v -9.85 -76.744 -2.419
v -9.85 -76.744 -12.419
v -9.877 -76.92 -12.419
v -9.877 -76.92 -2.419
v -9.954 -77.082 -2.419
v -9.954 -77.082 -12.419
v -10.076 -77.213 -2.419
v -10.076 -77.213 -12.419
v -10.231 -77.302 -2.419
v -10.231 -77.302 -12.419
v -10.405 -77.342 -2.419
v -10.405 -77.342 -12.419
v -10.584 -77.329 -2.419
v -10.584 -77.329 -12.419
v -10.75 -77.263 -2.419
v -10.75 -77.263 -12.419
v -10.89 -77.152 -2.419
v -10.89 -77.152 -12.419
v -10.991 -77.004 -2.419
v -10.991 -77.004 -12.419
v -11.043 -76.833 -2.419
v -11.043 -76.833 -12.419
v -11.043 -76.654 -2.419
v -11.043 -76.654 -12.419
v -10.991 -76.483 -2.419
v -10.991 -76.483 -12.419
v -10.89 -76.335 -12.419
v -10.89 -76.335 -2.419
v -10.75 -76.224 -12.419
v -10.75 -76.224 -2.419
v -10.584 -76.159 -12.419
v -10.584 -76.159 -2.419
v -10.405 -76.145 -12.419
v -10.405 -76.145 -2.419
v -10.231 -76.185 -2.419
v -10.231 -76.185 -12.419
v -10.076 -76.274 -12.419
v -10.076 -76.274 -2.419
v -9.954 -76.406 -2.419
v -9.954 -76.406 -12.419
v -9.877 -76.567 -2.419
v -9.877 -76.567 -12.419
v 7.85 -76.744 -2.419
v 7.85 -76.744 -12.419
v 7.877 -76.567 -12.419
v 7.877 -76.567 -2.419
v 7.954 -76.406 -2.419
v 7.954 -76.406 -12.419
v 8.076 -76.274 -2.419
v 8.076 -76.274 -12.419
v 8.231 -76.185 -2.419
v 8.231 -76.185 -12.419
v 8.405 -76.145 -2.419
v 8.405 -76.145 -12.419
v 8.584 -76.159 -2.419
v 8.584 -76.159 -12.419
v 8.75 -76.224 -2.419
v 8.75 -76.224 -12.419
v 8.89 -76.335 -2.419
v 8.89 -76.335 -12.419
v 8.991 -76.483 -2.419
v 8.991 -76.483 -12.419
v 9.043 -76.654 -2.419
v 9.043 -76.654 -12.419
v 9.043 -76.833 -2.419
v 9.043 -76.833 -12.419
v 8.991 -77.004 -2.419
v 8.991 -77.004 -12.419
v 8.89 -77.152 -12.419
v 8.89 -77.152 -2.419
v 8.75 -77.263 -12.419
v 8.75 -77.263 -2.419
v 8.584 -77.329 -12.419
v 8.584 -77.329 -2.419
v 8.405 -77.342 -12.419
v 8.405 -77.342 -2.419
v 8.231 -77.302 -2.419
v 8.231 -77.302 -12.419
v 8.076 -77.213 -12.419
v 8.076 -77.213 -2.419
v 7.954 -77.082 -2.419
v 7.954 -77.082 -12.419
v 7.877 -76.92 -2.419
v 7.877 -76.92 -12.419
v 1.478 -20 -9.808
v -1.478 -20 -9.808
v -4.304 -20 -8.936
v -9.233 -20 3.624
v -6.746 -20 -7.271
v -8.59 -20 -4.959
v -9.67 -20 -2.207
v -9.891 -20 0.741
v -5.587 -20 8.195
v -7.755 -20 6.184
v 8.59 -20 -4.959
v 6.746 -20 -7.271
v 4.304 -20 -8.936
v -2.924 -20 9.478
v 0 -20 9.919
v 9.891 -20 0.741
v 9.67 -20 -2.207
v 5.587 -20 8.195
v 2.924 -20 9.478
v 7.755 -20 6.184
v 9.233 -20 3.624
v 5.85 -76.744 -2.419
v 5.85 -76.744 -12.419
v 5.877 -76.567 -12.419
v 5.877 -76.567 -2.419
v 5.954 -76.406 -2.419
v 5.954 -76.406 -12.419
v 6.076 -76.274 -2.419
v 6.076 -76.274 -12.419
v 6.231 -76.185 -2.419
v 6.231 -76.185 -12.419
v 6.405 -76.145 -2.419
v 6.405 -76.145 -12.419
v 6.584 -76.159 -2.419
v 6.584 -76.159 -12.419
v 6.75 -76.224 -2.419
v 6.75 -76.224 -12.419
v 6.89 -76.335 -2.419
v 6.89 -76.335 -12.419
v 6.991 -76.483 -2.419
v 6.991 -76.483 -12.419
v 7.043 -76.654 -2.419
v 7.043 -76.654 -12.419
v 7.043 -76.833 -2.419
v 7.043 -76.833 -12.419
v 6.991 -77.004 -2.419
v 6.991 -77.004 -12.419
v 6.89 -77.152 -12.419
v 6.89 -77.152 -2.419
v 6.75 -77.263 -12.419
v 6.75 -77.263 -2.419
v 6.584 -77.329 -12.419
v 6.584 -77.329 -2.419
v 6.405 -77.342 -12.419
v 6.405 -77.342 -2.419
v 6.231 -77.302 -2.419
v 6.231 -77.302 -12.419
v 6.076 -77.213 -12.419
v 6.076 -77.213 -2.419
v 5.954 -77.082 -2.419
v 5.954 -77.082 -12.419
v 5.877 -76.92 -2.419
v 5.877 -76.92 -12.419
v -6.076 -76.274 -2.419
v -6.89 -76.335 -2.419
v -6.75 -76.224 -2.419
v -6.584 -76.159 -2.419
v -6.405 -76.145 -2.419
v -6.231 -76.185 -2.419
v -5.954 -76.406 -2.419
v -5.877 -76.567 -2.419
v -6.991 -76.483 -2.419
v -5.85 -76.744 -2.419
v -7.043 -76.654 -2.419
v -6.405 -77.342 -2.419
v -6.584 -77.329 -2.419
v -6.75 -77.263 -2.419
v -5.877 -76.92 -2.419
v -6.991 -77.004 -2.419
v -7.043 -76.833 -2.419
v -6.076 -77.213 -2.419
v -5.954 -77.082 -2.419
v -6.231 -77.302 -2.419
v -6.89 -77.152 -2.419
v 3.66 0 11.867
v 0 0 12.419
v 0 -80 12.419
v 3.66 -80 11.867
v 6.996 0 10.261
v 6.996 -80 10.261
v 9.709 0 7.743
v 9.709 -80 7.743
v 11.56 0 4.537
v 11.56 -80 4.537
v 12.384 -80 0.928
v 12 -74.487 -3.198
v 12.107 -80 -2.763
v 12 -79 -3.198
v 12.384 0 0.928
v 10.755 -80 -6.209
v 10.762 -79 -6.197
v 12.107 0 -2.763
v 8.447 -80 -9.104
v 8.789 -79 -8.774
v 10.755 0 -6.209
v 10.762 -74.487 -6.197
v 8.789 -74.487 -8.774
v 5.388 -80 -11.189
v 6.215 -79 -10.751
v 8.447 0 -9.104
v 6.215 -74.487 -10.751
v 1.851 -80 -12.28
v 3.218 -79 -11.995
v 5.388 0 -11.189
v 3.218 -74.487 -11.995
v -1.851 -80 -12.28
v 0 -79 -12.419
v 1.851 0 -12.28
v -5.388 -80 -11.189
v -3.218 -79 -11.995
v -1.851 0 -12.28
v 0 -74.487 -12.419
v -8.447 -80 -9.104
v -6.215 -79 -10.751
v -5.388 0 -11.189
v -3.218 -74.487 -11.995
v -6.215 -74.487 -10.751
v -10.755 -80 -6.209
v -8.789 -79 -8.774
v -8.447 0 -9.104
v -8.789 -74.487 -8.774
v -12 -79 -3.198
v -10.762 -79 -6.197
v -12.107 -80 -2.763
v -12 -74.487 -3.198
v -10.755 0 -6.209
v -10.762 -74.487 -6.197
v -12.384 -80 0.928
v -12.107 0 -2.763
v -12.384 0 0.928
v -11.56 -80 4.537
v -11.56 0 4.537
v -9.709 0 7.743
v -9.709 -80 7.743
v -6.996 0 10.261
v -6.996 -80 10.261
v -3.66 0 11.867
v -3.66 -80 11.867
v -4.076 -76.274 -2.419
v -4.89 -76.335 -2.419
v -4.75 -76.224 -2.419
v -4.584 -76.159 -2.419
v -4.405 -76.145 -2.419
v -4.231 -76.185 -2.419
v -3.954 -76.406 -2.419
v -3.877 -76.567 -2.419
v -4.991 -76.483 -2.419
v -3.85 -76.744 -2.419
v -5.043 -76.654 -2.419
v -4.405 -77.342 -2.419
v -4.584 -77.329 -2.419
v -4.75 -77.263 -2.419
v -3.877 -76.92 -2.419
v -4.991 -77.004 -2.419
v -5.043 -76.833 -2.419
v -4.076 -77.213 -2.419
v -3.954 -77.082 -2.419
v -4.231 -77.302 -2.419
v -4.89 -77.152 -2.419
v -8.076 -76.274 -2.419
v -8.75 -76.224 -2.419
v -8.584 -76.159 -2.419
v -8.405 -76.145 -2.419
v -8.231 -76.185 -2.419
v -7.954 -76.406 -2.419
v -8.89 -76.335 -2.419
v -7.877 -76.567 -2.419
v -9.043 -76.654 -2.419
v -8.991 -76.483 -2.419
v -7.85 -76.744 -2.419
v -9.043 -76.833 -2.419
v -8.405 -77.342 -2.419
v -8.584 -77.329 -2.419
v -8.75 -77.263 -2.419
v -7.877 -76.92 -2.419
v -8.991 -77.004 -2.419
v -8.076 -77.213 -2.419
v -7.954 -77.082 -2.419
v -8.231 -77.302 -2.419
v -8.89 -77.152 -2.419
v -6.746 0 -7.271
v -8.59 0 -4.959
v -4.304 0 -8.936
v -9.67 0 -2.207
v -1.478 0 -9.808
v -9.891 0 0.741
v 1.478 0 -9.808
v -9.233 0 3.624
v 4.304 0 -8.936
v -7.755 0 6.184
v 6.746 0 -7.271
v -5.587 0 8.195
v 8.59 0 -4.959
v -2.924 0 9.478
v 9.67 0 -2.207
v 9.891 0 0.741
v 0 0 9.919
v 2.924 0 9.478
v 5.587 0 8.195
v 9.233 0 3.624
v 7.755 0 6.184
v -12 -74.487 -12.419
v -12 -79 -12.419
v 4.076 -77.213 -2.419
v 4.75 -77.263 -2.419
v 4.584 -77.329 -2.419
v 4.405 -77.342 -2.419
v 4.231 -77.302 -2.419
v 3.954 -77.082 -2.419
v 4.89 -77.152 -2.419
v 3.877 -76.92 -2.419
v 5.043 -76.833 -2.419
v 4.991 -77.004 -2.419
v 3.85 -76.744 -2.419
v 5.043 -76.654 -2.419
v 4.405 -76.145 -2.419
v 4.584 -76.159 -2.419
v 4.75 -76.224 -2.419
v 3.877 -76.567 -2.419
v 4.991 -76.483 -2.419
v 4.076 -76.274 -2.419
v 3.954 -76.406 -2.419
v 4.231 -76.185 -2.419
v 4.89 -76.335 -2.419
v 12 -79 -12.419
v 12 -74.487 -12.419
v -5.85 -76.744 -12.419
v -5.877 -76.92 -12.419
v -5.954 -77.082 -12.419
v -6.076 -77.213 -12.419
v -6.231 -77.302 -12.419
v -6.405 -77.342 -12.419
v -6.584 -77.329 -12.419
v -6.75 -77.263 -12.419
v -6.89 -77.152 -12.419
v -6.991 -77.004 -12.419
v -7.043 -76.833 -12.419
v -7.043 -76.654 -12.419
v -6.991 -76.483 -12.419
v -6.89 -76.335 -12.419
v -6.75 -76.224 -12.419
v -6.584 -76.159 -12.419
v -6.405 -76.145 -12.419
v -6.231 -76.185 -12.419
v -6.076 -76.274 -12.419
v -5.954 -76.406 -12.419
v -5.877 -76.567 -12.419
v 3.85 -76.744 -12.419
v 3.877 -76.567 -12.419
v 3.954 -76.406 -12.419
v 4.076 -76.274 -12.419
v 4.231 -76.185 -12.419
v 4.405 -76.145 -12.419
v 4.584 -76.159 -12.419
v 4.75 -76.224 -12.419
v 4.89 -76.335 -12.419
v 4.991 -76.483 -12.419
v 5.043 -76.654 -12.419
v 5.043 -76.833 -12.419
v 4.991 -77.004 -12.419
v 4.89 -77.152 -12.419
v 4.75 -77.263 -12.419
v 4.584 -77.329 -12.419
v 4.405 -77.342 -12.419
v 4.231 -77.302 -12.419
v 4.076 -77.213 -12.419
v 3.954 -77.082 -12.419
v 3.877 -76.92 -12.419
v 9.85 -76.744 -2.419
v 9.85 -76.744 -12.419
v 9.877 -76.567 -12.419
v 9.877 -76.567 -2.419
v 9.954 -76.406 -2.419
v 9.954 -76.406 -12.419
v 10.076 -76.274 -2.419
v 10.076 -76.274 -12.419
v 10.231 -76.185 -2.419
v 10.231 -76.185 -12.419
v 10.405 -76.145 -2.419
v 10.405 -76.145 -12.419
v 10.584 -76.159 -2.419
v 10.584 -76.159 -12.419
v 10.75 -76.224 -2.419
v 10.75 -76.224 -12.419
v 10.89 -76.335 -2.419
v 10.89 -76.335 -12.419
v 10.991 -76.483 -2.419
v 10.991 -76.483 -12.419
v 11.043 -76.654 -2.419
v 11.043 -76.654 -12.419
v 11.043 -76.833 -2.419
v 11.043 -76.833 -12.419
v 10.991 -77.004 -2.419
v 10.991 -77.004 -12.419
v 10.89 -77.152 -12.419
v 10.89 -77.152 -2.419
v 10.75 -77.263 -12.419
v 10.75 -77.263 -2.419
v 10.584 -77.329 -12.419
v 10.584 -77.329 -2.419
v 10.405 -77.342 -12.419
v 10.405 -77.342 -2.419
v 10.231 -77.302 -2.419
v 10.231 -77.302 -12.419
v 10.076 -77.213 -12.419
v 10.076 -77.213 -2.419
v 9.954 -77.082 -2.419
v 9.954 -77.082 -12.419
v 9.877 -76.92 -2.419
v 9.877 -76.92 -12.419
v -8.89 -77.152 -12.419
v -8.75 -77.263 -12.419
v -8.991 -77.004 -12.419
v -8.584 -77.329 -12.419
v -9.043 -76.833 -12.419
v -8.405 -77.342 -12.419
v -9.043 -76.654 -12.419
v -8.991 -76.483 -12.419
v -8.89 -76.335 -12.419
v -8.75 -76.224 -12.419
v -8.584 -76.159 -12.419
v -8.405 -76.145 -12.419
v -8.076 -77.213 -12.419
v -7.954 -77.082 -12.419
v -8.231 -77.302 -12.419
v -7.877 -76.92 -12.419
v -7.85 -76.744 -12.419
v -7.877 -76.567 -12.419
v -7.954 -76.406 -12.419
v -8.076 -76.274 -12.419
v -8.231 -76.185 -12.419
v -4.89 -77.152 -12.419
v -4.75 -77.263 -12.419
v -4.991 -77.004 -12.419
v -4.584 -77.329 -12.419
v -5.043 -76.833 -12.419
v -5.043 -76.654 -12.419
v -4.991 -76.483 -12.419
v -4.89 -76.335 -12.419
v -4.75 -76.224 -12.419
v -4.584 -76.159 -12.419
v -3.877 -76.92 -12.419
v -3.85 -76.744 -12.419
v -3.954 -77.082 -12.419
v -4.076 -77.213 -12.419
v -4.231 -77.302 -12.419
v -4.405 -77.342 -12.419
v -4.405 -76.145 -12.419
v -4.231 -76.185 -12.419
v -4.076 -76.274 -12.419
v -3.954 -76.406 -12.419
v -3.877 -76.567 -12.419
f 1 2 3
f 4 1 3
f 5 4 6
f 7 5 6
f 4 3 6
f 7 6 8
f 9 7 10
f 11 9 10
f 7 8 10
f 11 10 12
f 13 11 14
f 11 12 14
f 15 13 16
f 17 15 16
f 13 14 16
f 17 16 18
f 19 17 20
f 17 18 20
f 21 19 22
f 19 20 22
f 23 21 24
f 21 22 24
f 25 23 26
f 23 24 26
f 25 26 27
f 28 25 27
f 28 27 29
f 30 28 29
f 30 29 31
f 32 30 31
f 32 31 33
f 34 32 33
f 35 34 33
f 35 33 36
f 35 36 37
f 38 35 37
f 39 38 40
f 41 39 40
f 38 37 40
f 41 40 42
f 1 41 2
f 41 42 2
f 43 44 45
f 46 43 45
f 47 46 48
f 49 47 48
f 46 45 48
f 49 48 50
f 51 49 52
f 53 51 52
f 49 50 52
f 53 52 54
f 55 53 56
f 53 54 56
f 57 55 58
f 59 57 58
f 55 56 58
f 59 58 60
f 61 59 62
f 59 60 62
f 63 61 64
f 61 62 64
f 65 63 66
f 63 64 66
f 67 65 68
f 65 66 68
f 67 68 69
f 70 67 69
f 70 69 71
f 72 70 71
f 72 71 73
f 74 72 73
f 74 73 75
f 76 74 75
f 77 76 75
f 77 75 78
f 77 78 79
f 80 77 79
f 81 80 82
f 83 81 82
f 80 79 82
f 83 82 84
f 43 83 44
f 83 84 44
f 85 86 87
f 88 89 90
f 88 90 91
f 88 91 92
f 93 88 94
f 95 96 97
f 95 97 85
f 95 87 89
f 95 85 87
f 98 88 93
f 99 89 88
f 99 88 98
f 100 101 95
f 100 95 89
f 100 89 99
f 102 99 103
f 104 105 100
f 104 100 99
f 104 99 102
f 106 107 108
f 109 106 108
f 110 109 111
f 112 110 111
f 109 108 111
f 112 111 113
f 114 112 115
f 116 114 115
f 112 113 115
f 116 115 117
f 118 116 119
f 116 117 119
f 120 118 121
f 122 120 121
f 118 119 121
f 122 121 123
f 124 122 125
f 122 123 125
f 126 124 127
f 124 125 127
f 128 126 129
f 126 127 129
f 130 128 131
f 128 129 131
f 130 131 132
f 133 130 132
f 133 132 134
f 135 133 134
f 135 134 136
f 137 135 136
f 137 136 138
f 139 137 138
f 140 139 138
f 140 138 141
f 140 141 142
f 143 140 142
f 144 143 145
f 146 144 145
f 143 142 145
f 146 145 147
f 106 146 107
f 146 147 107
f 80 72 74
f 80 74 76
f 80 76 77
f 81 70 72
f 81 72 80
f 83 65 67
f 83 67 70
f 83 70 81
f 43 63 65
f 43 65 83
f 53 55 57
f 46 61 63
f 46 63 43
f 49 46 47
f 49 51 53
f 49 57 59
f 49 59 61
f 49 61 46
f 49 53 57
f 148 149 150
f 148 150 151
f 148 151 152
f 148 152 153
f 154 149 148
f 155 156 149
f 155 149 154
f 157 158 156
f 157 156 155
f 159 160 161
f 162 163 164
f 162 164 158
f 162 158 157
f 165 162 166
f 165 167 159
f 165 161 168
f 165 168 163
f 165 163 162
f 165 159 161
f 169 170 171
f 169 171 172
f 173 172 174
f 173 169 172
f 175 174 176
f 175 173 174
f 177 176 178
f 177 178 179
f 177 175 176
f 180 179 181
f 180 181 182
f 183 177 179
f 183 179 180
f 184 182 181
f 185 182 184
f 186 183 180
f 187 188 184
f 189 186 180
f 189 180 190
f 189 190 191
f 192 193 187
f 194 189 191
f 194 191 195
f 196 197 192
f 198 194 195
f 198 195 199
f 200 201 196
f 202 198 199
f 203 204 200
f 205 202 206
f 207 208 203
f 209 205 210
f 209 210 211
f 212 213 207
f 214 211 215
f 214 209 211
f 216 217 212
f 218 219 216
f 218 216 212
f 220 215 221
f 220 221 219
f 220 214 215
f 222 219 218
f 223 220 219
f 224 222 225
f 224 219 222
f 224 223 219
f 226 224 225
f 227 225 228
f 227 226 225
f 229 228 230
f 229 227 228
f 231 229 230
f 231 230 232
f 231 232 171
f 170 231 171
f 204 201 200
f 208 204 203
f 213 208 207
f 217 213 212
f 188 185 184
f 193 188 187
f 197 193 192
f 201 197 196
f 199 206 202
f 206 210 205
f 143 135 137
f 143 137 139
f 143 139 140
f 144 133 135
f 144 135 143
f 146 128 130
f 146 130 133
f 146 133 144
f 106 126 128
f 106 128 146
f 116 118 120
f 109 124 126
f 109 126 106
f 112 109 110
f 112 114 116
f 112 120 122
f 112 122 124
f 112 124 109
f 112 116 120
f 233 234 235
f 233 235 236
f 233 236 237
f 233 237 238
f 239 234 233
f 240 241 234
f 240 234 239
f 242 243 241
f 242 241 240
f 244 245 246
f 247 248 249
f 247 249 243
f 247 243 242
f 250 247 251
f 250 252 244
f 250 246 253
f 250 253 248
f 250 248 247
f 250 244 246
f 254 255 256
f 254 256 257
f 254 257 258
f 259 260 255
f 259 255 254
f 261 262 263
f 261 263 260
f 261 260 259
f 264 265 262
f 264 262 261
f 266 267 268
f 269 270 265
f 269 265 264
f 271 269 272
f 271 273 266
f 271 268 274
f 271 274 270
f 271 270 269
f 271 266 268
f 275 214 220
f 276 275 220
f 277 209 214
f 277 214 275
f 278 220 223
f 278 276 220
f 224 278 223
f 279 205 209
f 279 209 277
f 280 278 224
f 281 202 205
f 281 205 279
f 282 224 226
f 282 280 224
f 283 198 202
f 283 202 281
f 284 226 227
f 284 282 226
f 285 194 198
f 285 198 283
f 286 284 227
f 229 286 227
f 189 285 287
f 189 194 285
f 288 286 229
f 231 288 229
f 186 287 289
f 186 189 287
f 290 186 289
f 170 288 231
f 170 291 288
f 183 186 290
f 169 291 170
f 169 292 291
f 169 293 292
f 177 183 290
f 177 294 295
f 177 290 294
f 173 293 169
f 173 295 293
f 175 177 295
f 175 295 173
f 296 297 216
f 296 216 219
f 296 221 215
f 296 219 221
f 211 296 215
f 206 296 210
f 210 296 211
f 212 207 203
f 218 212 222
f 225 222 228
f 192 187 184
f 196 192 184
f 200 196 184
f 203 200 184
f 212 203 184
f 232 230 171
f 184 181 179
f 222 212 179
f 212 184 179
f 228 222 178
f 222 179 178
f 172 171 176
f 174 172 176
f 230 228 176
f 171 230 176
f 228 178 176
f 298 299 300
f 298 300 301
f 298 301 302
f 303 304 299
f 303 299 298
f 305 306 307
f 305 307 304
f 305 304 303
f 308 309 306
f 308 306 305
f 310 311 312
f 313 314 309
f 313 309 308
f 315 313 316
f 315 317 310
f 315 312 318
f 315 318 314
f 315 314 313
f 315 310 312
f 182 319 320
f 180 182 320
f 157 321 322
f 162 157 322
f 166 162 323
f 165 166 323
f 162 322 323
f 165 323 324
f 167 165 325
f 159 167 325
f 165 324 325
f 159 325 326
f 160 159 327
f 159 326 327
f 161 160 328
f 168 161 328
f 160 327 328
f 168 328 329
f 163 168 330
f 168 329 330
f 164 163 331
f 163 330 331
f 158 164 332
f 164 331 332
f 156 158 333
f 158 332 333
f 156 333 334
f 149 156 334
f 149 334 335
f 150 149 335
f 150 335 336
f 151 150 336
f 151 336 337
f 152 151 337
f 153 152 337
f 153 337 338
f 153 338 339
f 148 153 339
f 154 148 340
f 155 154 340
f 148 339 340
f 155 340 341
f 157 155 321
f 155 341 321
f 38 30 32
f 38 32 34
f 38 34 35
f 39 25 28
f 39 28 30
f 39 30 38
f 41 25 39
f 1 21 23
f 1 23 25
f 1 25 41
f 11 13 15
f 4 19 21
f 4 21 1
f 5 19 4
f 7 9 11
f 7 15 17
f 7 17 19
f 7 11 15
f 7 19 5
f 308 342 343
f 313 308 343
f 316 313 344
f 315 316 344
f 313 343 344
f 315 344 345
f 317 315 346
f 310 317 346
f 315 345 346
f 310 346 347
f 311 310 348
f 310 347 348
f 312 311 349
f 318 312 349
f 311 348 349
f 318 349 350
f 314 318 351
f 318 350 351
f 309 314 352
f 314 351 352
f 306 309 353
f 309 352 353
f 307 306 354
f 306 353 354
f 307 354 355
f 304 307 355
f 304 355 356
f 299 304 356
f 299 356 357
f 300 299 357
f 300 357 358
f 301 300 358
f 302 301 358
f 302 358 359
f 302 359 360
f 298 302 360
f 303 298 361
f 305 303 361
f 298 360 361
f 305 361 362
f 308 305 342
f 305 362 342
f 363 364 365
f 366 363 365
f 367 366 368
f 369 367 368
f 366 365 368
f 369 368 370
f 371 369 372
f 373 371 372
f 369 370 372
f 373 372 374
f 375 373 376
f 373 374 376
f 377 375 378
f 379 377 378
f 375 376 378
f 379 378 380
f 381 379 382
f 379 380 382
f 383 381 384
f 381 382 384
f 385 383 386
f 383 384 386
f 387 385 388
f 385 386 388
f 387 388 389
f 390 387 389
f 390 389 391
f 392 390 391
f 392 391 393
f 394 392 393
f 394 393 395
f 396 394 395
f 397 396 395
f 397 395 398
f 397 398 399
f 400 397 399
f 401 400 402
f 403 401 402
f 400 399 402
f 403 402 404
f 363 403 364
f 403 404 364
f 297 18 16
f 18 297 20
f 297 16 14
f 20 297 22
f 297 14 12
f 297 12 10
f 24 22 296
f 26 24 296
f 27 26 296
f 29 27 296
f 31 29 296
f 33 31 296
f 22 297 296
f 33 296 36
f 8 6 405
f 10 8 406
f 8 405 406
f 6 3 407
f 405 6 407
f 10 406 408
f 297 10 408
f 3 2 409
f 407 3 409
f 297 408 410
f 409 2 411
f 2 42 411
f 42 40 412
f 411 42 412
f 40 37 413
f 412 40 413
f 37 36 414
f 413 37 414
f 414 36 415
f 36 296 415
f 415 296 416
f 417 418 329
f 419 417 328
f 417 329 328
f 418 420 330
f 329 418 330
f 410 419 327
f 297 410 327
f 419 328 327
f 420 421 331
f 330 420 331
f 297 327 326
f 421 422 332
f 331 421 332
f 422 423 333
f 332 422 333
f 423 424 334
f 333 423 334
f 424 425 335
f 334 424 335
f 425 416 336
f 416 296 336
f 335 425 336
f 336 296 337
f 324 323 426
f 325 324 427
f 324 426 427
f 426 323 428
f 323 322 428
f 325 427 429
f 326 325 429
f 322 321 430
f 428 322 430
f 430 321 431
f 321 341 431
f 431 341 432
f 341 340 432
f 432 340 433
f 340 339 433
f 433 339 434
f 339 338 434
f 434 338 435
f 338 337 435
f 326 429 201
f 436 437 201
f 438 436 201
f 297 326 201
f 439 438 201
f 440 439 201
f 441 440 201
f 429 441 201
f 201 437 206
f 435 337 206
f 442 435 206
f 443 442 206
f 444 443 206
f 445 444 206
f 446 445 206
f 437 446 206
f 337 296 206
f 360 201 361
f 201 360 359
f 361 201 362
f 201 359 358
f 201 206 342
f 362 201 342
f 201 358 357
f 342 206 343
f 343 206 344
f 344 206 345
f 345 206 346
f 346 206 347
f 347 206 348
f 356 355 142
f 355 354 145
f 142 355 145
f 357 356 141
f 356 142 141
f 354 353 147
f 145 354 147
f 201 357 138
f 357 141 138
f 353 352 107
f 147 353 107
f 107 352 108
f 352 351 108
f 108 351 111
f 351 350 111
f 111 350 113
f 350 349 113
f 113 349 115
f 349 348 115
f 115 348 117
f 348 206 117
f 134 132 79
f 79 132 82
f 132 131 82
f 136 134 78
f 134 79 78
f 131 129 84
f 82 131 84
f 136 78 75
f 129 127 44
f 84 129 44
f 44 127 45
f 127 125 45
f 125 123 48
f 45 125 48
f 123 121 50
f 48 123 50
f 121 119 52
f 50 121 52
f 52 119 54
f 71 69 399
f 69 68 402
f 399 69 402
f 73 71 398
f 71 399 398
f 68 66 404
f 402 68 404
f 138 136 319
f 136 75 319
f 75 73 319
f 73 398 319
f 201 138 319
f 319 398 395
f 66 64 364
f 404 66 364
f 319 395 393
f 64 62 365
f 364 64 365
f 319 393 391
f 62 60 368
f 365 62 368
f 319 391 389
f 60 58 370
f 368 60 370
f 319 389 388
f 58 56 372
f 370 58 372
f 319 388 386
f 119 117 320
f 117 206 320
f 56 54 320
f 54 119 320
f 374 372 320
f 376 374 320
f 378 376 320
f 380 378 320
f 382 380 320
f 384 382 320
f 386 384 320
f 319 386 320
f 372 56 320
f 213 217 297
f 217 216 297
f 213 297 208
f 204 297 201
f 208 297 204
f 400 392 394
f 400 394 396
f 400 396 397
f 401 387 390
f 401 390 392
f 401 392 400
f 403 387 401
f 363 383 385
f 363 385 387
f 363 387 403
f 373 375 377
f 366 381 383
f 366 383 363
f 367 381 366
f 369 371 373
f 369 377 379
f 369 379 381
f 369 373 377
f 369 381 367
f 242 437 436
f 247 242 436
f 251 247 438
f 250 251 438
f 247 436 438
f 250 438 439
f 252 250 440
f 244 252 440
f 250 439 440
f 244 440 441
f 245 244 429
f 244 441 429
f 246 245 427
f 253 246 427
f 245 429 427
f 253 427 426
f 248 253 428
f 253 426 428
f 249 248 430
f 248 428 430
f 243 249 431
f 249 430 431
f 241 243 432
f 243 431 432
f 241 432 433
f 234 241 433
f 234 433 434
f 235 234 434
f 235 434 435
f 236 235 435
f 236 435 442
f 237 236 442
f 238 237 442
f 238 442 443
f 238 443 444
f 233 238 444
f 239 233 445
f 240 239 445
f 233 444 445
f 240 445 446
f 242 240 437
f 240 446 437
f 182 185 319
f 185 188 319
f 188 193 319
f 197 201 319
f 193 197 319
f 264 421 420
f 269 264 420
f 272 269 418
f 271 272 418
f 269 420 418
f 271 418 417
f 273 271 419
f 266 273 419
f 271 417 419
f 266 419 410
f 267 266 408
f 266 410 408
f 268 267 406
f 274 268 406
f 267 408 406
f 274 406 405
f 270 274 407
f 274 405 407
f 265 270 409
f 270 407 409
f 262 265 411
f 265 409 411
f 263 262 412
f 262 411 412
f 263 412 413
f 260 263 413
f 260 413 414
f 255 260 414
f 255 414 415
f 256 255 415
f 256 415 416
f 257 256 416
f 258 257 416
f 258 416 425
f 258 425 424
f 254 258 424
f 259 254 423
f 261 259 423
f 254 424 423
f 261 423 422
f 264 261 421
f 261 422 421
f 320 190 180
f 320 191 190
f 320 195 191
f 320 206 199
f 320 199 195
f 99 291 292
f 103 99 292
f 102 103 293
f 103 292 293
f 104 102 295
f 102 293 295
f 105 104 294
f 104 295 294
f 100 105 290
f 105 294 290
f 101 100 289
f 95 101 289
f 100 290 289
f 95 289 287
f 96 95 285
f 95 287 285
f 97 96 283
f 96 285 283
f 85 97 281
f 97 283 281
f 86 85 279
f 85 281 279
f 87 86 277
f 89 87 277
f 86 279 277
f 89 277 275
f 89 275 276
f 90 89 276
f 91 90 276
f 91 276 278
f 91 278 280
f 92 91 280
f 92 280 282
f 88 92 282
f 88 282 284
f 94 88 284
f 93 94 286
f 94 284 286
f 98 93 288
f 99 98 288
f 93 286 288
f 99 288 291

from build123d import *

# Parameters (mm, degrees)
SKETCH1_R                = 12.4187
BOSS_EXTRUDE1_DEPTH      = 80
SKETCH1_3_R              = 9.9187
CUT_EXTRUDE1_DEPTH       = 20
BOSS_EXTRUDE2_REACH      = 86.682
BOSS_EXTRUDE2_END_RADIUS = 12.4187
SKETCH2_W                = 24
SKETCH2_H                = 4.51281607
SKETCH3_R                = 0.6
CUT_EXTRUDE2_DEPTH       = 10


with BuildPart() as part:
    # Sketch1 → Boss-Extrude1 (new body)
    with BuildSketch(Plane(origin=(0, 0, 0), x_dir=(1, 0, 0), z_dir=(0, 1, 0))):
        Circle(SKETCH1_R)
    extrude(amount=-BOSS_EXTRUDE1_DEPTH)

    # Sketch1<3> → Cut-Extrude1 (cut)
    with BuildSketch(Plane(origin=(0, 0, 0), x_dir=(1, 0, 0), z_dir=(0, 1, 0))):
        Circle(SKETCH1_3_R)
    extrude(amount=-CUT_EXTRUDE1_DEPTH, mode=Mode.SUBTRACT)

    # Boss-Extrude2: up to this cylinder (the profile starts outside it)
    boss_extrude2_end = Plane(origin=(0, -76.743592, 0), z_dir=(0, 1, 0)) * Cylinder(BOSS_EXTRUDE2_END_RADIUS, 199.2014, mode=Mode.PRIVATE)
    # Sketch2 → Boss-Extrude2 (add, up to the surface)
    with BuildSketch(Plane.XY.offset(-12.4187), mode=Mode.PRIVATE) as boss_extrude2_sk1:
        with Locations((0, -76.743591965)):
            Rectangle(SKETCH2_W, SKETCH2_H)
    boss_extrude2_tool1 = extrude(boss_extrude2_sk1.sketch, amount=BOSS_EXTRUDE2_REACH, mode=Mode.PRIVATE) - boss_extrude2_end
    add(boss_extrude2_tool1.solids().sort_by_distance((0, -76.743592, -12.4187))[0])
    add(boss_extrude2_tool1.solids().sort_by_distance((0, -76.743592, -12.4187))[1])

    # Sketch3 → Cut-Extrude2 (cut)
    with BuildSketch(Plane(origin=(0, 0, -12.4187), x_dir=(-1, 0, 0), z_dir=(0, 0, -1))):
        with Locations((-4.45, -76.743591965)):
            Circle(SKETCH3_R)
        with Locations((-6.45, -76.743591965)):
            Circle(SKETCH3_R)
        with Locations((-8.45, -76.743591965)):
            Circle(SKETCH3_R)
        with Locations((-10.45, -76.743591965)):
            Circle(SKETCH3_R)
        with Locations((10.45, -76.743591965)):
            Circle(SKETCH3_R)
        with Locations((8.45, -76.743591965)):
            Circle(SKETCH3_R)
        with Locations((6.45, -76.743591965)):
            Circle(SKETCH3_R)
        with Locations((4.45, -76.743591965)):
            Circle(SKETCH3_R)
    extrude(amount=-CUT_EXTRUDE2_DEPTH, mode=Mode.SUBTRACT)


solid = part.part
